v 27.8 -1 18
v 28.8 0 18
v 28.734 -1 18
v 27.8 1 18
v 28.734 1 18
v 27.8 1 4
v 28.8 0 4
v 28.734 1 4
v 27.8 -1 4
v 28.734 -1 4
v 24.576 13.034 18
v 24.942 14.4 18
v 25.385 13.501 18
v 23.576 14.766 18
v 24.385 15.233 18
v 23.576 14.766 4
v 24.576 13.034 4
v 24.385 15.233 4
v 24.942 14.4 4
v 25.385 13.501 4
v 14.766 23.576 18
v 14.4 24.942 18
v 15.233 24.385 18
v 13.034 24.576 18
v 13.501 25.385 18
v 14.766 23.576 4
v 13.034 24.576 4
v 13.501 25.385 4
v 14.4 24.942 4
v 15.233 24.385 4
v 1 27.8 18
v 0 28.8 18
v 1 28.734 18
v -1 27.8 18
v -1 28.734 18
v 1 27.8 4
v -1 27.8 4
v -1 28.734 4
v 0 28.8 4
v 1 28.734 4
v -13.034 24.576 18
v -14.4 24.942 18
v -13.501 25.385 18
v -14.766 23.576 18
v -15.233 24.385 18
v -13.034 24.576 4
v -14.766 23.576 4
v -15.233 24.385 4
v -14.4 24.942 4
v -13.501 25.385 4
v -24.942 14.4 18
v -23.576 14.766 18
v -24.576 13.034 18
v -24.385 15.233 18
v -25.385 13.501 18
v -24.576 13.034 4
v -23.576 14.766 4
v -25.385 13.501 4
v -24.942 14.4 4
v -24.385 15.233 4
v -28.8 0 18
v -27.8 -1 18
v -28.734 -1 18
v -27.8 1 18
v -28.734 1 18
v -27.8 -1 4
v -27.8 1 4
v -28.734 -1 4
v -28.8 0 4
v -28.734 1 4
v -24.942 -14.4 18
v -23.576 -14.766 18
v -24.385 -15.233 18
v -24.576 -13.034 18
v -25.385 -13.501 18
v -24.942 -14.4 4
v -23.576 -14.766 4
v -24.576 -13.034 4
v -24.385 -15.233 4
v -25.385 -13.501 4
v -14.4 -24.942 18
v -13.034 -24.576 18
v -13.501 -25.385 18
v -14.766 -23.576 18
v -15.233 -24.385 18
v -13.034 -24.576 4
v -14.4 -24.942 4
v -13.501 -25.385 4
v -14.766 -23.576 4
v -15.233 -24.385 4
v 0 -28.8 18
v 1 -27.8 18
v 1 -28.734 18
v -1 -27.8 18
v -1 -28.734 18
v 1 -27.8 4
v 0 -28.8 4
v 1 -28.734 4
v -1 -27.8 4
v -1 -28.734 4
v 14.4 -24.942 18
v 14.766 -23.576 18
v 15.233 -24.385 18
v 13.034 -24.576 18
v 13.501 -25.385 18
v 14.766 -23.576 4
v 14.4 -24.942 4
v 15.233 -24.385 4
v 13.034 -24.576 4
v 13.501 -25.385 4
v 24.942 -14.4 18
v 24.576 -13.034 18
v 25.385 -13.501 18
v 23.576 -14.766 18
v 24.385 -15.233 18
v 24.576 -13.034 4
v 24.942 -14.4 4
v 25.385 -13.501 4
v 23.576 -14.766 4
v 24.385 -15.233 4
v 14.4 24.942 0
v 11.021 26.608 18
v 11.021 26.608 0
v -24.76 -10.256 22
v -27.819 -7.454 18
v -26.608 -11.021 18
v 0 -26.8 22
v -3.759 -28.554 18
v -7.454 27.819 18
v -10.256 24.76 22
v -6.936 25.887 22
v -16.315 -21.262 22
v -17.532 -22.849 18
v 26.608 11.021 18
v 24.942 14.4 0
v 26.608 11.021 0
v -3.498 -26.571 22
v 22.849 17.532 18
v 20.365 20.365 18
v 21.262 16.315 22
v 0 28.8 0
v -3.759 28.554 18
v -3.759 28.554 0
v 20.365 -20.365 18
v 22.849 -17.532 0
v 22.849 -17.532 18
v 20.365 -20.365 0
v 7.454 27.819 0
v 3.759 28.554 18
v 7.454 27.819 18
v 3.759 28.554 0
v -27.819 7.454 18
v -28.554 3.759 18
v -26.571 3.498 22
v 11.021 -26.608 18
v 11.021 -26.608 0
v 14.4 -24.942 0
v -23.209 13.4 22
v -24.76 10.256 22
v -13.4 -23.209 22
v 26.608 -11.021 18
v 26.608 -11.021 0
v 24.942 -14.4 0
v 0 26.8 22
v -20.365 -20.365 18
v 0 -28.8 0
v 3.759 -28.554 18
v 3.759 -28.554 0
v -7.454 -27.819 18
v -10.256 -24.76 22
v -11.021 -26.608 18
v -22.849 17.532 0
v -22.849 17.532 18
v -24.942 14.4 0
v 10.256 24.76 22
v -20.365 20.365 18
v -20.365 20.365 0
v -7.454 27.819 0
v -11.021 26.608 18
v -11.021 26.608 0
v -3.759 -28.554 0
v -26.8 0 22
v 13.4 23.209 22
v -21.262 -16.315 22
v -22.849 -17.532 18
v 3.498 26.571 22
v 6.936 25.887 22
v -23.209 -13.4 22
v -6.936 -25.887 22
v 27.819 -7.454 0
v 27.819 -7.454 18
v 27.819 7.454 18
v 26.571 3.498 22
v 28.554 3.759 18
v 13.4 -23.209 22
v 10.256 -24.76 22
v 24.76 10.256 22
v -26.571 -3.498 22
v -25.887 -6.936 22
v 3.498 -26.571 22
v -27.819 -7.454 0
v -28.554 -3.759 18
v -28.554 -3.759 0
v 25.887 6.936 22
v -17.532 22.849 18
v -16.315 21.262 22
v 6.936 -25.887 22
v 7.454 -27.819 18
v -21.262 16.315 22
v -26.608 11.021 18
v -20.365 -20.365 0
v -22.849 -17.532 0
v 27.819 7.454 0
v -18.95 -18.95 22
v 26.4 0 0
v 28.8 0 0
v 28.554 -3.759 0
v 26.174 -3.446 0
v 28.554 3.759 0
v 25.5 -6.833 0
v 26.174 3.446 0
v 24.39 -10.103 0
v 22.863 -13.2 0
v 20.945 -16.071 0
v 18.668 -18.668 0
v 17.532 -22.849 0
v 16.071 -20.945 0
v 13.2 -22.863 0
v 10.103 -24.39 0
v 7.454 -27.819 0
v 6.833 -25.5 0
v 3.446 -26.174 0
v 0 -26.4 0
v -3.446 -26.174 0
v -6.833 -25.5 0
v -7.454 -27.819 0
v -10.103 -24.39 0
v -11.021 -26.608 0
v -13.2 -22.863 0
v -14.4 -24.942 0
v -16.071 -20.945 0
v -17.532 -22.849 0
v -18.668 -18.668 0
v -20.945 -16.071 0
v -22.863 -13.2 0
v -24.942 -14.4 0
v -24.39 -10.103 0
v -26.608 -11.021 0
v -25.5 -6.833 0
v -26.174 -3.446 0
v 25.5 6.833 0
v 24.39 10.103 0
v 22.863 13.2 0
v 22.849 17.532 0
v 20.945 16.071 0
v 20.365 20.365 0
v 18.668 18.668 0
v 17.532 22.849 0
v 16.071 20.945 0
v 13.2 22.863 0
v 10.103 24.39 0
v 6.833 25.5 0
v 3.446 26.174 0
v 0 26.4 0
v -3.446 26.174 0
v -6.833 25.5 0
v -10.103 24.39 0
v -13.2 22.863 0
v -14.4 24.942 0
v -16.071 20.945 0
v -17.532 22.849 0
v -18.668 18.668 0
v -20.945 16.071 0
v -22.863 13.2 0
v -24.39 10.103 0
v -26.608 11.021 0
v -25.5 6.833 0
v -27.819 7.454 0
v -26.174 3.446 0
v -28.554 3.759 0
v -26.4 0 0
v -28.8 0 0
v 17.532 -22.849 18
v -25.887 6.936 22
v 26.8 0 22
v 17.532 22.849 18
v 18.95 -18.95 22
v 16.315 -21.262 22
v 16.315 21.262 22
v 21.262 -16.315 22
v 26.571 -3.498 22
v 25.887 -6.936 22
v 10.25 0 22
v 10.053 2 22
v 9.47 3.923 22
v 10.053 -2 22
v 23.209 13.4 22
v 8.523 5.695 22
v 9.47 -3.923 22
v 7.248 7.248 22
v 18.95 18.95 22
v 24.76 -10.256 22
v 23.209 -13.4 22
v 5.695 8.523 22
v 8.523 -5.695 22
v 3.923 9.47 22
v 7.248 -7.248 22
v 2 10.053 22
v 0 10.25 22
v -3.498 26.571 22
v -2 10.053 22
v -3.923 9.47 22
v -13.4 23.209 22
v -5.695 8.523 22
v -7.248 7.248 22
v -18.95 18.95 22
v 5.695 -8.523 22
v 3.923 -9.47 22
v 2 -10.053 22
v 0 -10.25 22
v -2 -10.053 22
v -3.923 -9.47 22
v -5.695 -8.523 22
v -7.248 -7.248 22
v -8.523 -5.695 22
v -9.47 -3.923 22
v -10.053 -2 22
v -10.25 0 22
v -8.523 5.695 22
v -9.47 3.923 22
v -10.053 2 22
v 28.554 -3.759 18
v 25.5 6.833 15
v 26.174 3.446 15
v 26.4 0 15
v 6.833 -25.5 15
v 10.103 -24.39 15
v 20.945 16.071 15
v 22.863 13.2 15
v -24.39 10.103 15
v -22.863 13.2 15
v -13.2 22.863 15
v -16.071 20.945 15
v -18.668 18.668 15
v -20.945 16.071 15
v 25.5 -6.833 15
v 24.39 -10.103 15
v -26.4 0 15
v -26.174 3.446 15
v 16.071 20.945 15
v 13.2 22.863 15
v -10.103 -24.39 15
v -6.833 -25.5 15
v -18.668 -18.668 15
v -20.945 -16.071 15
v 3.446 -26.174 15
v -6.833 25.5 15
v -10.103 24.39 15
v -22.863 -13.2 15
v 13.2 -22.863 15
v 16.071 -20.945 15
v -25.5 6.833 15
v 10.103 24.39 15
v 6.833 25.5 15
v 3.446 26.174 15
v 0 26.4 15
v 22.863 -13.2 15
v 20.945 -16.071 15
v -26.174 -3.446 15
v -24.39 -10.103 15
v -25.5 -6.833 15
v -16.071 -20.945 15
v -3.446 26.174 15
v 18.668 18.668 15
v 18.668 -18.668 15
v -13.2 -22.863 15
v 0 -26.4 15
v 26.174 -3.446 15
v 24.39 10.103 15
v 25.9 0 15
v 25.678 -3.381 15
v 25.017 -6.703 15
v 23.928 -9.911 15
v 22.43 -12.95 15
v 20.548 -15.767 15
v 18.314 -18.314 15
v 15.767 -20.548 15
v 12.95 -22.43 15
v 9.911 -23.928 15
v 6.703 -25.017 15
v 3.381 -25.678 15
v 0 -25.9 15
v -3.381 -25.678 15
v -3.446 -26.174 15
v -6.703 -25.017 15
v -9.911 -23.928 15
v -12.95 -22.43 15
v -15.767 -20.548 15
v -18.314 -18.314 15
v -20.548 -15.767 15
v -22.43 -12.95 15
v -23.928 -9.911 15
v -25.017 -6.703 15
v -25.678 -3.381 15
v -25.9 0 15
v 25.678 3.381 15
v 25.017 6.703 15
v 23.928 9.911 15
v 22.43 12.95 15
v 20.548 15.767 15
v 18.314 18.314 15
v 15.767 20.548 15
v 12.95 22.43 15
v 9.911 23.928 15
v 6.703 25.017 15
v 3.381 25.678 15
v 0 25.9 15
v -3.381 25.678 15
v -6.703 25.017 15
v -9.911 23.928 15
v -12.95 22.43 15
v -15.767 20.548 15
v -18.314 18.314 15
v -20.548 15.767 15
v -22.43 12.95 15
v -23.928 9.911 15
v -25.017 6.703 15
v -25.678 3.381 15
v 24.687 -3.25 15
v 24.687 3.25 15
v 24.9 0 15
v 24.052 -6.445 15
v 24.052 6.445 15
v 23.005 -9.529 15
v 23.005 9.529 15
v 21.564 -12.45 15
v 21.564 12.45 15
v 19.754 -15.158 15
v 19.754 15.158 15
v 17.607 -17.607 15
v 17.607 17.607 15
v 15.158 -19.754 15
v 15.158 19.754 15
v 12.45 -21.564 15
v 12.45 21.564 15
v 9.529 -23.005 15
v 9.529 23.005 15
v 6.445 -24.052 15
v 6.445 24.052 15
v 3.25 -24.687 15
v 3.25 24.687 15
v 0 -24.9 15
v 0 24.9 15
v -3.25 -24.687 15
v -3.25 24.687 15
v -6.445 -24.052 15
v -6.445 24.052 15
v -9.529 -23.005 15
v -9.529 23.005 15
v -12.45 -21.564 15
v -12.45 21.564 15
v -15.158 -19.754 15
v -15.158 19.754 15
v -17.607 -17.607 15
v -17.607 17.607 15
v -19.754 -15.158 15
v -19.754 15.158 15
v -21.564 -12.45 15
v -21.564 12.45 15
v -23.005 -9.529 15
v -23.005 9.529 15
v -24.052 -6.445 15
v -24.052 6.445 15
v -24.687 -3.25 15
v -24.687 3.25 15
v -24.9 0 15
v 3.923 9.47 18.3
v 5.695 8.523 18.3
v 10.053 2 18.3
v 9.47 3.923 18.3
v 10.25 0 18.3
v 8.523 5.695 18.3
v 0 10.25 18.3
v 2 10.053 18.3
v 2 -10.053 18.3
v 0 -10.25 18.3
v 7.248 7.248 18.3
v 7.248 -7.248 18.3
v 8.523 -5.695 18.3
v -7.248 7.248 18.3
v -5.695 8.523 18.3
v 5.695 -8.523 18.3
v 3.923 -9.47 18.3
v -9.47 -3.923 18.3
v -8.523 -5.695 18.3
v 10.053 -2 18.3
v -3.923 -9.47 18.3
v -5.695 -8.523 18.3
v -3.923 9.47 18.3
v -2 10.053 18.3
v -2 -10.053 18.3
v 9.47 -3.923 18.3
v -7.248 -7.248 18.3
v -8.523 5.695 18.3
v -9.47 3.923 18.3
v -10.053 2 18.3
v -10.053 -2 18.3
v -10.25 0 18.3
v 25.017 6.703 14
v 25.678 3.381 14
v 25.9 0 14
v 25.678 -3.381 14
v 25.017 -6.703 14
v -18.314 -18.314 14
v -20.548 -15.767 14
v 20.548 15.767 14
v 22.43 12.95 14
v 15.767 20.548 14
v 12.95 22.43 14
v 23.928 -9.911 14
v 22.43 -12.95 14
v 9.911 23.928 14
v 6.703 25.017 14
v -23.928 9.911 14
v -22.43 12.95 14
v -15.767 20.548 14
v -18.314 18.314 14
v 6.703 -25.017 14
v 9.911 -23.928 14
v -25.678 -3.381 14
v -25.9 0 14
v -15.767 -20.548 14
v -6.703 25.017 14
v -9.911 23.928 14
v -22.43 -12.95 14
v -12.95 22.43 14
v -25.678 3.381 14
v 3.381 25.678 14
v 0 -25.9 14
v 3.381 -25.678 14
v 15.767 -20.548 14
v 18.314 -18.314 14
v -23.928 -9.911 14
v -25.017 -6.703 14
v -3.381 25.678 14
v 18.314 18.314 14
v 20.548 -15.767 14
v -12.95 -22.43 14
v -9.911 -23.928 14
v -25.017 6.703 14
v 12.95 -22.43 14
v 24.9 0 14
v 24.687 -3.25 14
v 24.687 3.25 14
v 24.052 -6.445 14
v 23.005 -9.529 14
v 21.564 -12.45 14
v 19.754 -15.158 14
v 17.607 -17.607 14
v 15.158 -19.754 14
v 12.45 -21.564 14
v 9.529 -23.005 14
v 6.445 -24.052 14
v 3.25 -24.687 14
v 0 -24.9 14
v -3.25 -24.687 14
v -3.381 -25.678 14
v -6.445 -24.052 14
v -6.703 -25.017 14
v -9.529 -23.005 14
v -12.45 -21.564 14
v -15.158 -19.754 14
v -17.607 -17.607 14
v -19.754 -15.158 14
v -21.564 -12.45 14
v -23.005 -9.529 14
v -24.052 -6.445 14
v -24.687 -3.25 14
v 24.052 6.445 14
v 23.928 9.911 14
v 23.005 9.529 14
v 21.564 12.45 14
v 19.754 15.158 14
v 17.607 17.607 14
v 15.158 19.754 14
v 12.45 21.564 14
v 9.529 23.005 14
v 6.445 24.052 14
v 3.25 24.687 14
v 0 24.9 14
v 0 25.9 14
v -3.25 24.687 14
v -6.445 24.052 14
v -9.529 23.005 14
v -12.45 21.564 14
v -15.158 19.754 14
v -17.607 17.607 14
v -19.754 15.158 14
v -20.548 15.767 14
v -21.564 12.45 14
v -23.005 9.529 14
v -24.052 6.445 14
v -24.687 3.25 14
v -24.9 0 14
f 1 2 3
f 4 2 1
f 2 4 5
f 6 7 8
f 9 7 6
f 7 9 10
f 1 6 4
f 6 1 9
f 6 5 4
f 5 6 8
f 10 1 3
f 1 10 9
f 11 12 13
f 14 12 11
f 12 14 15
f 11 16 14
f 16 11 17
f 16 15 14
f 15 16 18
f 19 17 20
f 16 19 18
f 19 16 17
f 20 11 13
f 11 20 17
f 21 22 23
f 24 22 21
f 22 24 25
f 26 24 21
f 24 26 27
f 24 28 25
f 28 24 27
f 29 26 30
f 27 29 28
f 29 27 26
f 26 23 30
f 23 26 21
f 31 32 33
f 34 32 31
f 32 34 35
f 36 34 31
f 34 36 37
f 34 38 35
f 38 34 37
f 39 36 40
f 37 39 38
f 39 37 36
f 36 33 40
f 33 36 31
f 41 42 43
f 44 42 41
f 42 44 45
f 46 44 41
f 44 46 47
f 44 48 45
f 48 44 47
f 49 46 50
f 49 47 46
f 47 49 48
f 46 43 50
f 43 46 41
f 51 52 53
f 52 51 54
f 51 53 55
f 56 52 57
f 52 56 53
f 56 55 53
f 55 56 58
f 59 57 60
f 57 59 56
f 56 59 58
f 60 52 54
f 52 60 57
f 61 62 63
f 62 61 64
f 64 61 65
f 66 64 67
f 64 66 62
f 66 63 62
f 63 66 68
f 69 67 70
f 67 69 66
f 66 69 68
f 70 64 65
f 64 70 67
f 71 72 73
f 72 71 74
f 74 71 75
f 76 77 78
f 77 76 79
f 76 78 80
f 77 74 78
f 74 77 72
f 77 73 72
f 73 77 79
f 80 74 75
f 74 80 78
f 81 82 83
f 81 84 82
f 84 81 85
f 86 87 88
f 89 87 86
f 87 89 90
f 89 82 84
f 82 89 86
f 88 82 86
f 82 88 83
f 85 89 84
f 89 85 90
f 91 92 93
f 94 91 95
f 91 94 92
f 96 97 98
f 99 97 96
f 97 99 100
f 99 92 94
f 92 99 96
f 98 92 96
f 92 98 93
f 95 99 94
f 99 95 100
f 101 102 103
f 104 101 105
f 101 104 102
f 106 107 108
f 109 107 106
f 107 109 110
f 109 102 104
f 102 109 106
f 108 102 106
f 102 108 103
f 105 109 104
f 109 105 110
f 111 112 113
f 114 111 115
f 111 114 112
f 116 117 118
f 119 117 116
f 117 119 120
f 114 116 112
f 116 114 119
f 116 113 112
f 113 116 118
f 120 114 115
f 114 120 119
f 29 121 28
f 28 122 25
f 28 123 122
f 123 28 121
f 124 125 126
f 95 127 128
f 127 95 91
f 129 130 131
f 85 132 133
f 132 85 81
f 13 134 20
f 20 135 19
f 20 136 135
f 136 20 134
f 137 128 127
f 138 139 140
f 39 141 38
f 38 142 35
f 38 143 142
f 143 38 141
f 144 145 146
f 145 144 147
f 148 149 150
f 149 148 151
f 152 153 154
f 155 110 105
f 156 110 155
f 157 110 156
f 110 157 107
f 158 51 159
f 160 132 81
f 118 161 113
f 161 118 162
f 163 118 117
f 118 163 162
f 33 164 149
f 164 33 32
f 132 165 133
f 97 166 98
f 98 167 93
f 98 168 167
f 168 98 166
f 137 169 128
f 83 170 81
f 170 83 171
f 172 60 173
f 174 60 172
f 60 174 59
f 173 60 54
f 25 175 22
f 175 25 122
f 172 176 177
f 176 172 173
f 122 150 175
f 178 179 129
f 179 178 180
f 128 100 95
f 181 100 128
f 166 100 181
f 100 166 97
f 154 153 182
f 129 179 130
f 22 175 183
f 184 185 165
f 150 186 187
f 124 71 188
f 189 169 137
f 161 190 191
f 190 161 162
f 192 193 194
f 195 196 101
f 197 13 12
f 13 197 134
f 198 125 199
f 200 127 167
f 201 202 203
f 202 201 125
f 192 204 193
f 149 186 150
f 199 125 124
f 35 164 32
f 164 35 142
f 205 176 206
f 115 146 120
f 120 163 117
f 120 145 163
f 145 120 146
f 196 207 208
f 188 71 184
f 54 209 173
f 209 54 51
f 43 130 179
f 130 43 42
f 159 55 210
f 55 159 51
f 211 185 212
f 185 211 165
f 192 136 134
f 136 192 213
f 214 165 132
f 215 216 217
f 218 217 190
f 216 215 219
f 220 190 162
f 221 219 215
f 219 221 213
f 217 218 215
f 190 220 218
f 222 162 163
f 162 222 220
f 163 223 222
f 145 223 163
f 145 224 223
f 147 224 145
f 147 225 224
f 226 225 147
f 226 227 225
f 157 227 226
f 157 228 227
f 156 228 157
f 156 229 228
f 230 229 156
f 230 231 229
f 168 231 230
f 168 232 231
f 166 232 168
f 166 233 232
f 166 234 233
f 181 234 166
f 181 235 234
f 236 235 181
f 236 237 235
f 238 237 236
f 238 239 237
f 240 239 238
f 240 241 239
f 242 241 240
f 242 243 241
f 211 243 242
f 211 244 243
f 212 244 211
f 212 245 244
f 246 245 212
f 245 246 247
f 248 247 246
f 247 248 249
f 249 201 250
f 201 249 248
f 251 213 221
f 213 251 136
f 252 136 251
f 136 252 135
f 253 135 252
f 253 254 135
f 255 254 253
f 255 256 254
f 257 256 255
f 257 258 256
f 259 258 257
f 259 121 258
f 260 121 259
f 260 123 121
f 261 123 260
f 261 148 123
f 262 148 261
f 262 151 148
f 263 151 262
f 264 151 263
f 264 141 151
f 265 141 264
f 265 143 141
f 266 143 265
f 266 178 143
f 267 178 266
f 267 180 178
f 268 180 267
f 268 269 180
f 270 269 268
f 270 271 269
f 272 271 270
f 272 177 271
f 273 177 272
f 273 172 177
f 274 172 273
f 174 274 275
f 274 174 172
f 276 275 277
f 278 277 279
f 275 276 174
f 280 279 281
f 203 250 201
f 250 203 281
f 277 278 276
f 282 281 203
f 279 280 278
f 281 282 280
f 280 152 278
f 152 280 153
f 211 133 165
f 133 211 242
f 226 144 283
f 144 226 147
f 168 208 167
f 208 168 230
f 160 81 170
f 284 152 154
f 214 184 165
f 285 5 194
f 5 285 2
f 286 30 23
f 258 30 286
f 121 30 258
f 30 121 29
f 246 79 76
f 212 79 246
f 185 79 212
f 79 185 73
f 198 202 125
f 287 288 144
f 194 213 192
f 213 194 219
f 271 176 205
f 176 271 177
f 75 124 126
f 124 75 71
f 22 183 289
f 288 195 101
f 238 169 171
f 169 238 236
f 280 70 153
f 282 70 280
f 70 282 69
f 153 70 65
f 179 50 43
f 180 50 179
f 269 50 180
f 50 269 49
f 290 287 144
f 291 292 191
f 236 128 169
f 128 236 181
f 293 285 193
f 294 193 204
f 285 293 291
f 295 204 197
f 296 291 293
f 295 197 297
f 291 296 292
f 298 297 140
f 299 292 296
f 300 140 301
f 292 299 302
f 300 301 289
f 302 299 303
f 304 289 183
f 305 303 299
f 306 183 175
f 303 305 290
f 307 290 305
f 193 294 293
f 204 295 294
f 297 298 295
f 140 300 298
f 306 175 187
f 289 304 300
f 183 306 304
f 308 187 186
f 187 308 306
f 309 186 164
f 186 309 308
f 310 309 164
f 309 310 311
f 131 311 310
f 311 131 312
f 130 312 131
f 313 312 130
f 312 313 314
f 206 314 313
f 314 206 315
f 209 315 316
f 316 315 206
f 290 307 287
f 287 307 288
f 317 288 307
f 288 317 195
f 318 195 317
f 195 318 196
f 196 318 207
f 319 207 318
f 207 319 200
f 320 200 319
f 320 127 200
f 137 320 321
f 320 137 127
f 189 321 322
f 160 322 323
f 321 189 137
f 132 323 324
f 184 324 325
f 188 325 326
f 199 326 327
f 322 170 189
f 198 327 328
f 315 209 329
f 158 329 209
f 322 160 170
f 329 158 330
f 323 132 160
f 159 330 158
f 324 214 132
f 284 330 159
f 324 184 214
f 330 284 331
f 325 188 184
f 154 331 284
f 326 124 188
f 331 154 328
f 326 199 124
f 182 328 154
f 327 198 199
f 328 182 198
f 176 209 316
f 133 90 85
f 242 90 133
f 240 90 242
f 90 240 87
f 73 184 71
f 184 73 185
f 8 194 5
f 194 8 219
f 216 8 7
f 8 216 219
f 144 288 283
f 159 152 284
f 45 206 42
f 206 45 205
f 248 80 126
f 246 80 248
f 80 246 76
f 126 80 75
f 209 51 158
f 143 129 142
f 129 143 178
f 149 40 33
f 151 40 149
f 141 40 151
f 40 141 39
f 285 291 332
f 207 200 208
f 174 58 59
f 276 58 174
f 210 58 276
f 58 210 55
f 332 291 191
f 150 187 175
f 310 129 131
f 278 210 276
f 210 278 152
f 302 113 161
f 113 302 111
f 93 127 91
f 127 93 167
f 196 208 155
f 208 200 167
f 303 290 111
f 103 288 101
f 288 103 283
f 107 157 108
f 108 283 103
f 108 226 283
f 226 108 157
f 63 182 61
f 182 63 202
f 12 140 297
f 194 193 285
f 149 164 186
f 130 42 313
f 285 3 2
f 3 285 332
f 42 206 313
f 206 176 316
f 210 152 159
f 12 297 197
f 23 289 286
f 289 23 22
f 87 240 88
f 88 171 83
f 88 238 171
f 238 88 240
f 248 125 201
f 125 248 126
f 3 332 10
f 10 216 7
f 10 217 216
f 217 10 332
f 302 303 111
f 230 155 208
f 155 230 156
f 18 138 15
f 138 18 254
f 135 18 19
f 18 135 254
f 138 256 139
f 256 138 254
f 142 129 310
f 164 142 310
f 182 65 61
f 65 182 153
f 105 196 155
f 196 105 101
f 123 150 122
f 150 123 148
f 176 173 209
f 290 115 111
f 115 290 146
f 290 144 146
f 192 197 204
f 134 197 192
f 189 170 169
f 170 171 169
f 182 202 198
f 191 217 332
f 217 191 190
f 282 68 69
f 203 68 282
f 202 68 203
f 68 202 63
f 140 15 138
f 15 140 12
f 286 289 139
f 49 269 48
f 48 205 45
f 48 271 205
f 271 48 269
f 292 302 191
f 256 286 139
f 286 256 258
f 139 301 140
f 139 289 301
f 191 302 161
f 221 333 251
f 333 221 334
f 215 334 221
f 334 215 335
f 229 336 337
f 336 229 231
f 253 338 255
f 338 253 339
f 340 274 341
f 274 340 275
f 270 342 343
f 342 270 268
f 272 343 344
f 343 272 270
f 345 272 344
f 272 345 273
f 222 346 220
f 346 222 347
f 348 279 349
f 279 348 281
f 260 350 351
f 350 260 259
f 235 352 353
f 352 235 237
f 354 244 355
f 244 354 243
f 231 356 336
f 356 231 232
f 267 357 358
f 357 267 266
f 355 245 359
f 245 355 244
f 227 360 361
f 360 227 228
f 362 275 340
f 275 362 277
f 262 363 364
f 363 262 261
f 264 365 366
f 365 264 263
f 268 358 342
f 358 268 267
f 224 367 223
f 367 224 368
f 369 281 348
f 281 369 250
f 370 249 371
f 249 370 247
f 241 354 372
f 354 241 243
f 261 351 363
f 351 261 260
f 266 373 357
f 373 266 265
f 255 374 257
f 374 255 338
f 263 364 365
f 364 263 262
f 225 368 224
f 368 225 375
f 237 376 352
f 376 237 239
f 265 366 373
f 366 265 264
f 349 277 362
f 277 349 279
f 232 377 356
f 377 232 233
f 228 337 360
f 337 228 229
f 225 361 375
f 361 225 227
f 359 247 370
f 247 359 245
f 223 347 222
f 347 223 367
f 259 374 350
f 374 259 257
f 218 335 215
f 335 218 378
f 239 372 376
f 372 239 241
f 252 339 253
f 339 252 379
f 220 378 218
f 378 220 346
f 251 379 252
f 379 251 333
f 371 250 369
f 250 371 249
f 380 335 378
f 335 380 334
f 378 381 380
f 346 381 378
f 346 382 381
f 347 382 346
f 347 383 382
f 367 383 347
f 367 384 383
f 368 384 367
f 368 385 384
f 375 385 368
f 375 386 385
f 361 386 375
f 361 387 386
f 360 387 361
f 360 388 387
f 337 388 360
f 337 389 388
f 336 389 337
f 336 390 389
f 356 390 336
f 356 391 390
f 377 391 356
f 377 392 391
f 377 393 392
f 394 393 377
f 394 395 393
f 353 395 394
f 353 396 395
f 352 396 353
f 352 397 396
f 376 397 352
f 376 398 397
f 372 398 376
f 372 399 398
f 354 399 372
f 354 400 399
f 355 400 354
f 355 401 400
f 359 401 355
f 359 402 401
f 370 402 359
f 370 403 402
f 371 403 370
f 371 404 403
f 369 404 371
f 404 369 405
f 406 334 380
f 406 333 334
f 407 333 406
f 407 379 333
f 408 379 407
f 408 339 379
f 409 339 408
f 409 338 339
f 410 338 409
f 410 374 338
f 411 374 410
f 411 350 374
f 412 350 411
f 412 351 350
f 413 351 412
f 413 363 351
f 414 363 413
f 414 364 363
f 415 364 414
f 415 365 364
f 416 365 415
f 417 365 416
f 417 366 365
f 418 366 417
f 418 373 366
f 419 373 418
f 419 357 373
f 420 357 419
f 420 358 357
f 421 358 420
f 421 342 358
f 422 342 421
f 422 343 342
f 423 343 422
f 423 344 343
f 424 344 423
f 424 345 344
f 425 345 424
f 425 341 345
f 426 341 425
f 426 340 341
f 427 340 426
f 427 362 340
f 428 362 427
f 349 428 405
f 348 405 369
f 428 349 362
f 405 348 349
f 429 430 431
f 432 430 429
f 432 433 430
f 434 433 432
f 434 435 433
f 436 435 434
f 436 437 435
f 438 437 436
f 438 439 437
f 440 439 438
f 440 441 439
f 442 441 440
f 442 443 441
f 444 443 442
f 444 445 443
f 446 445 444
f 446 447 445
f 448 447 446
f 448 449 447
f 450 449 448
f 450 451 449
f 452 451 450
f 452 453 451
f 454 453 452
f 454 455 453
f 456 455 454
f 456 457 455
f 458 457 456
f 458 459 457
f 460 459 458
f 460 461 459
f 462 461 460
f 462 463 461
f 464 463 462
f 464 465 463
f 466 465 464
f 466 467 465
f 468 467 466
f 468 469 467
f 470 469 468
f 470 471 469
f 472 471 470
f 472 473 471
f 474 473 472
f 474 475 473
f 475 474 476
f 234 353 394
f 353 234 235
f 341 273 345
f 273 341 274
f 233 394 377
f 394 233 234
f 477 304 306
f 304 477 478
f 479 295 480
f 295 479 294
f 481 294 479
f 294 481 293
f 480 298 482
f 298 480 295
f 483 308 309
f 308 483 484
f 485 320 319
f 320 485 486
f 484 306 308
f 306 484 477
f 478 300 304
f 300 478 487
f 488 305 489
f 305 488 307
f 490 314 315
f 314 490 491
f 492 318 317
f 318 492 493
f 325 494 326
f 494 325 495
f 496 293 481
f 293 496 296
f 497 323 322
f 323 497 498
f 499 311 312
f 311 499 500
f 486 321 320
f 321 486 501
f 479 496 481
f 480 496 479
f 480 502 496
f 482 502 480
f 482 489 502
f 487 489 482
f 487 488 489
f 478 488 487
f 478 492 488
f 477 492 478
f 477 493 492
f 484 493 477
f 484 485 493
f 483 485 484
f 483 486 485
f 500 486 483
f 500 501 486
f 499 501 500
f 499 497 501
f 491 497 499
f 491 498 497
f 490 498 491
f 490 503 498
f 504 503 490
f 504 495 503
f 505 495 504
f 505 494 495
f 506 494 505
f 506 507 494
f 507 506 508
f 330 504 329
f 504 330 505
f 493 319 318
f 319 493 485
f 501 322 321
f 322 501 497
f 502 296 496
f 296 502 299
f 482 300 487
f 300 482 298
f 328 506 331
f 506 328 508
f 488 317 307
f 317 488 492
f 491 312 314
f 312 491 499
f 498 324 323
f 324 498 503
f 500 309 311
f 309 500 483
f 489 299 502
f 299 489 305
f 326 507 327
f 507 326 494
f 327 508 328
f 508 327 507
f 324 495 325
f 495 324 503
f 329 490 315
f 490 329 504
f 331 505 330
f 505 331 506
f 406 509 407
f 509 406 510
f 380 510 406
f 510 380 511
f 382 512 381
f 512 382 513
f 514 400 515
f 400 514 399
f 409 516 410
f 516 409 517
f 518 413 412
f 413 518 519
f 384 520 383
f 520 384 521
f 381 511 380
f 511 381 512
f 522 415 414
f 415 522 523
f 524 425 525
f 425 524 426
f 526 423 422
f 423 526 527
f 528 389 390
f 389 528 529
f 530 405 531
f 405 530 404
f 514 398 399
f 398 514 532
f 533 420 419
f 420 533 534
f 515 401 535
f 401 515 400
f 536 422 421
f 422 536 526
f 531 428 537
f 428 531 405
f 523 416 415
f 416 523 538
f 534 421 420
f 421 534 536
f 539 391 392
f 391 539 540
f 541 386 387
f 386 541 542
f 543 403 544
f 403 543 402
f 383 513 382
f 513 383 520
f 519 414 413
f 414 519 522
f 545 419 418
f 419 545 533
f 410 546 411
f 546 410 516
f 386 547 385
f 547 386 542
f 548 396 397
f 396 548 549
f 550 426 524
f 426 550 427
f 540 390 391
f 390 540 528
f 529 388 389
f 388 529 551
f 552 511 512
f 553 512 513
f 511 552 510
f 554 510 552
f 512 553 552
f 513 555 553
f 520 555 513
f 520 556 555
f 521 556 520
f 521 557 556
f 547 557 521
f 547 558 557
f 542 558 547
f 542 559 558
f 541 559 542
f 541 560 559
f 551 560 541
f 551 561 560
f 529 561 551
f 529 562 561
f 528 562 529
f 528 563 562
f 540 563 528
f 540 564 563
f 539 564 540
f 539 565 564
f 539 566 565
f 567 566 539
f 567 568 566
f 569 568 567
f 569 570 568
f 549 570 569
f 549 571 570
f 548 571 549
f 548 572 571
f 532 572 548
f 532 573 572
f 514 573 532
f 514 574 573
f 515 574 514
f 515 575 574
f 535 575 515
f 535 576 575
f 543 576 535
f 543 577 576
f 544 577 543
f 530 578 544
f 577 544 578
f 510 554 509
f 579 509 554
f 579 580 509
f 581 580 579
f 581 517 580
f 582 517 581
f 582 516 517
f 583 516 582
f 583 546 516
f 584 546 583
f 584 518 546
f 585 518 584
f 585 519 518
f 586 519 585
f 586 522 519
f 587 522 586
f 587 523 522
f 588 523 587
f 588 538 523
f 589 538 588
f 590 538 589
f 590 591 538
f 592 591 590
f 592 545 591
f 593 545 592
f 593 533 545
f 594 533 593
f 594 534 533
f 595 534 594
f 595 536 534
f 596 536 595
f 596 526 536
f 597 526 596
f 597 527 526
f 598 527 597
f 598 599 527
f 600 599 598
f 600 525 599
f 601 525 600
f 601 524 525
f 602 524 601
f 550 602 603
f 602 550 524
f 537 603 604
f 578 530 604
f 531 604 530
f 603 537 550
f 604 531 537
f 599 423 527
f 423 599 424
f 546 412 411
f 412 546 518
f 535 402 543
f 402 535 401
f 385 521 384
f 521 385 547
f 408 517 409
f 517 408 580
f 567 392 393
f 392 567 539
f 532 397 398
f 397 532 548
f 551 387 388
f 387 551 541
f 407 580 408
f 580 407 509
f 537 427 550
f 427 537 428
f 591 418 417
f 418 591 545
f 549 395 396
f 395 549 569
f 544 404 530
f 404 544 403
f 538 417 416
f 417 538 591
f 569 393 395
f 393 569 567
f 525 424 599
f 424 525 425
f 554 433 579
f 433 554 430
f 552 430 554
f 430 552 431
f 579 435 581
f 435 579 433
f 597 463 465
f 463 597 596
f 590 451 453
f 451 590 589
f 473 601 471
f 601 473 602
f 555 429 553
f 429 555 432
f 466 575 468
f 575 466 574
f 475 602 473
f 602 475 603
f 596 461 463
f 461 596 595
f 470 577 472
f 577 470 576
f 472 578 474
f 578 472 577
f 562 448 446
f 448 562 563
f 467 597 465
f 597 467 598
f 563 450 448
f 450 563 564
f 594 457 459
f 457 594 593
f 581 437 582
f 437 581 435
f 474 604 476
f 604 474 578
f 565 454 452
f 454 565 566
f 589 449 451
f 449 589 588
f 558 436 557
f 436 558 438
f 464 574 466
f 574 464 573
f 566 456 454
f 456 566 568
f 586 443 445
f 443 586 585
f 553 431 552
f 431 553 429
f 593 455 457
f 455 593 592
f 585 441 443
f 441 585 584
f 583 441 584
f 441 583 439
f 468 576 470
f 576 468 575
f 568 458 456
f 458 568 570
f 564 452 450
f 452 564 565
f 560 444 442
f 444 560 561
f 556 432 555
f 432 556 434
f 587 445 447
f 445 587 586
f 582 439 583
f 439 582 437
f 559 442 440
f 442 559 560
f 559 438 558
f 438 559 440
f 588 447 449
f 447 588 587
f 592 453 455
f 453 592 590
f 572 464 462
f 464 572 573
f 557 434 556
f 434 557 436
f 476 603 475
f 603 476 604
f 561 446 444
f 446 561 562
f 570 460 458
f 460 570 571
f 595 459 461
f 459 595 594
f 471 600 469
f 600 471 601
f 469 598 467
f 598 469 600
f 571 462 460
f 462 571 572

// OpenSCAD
// Magnetic Spice Jar Lid — Fridge-Mount
// Jar lid snaps onto standard spice jar, magnet holds to fridge
// PETG — 0.2mm, 4 walls, 25% infill
// Hardware: 1x N52 neodymium magnet 20x3mm per lid

JAR_D      = 52;    // Standard spice jar neck OD — adjust!
JAR_PLAY   = 0.8;   // Fit tolerance — increase if too tight
LID_H      = 22;
WALL_T     = 2.8;
MAGNET_D   = 20.5;  // 20mm + 0.5 clearance
MAGNET_H   = 3.2;   // 3mm + 0.2
THREAD_PITCH = 3.0; // Approximate thread pitch (no real threading — friction fit)

module jar_lid() {
    difference() {
        union() {
            // Outer body — slightly domed top
            hull() {
                cylinder(d = JAR_D + WALL_T*2, h = LID_H - 4, $fn = 48);
                translate([0, 0, LID_H - 4])
                    cylinder(d = JAR_D + WALL_T*2 - 4, h = 4, $fn = 48);
            }
        }
        // Inner socket for jar neck
        translate([0, 0, -1])
            cylinder(d = JAR_D + JAR_PLAY, h = LID_H - 6, $fn = 48);
        // Magnet pocket in top (press-fit, add drop of CA glue)
        translate([0, 0, LID_H - MAGNET_H - 0.5])
            cylinder(d = MAGNET_D, h = MAGNET_H + 1, $fn = 32);
        // Grip ridges (subtract)
        for (i = [0:11])
            rotate([0, 0, i*30])
                translate([JAR_D/2 + WALL_T - 1, -1, 4])
                    cube([2, 2, LID_H - 8]);
    }
    // Inner friction ring (holds jar)
    translate([0, 0, LID_H - 8])
        difference() {
            cylinder(d = JAR_D + JAR_PLAY - 1, h = 4, $fn = 48);
            cylinder(d = JAR_D + JAR_PLAY - 3, h = 5, $fn = 48);
        }
}

jar_lid();
